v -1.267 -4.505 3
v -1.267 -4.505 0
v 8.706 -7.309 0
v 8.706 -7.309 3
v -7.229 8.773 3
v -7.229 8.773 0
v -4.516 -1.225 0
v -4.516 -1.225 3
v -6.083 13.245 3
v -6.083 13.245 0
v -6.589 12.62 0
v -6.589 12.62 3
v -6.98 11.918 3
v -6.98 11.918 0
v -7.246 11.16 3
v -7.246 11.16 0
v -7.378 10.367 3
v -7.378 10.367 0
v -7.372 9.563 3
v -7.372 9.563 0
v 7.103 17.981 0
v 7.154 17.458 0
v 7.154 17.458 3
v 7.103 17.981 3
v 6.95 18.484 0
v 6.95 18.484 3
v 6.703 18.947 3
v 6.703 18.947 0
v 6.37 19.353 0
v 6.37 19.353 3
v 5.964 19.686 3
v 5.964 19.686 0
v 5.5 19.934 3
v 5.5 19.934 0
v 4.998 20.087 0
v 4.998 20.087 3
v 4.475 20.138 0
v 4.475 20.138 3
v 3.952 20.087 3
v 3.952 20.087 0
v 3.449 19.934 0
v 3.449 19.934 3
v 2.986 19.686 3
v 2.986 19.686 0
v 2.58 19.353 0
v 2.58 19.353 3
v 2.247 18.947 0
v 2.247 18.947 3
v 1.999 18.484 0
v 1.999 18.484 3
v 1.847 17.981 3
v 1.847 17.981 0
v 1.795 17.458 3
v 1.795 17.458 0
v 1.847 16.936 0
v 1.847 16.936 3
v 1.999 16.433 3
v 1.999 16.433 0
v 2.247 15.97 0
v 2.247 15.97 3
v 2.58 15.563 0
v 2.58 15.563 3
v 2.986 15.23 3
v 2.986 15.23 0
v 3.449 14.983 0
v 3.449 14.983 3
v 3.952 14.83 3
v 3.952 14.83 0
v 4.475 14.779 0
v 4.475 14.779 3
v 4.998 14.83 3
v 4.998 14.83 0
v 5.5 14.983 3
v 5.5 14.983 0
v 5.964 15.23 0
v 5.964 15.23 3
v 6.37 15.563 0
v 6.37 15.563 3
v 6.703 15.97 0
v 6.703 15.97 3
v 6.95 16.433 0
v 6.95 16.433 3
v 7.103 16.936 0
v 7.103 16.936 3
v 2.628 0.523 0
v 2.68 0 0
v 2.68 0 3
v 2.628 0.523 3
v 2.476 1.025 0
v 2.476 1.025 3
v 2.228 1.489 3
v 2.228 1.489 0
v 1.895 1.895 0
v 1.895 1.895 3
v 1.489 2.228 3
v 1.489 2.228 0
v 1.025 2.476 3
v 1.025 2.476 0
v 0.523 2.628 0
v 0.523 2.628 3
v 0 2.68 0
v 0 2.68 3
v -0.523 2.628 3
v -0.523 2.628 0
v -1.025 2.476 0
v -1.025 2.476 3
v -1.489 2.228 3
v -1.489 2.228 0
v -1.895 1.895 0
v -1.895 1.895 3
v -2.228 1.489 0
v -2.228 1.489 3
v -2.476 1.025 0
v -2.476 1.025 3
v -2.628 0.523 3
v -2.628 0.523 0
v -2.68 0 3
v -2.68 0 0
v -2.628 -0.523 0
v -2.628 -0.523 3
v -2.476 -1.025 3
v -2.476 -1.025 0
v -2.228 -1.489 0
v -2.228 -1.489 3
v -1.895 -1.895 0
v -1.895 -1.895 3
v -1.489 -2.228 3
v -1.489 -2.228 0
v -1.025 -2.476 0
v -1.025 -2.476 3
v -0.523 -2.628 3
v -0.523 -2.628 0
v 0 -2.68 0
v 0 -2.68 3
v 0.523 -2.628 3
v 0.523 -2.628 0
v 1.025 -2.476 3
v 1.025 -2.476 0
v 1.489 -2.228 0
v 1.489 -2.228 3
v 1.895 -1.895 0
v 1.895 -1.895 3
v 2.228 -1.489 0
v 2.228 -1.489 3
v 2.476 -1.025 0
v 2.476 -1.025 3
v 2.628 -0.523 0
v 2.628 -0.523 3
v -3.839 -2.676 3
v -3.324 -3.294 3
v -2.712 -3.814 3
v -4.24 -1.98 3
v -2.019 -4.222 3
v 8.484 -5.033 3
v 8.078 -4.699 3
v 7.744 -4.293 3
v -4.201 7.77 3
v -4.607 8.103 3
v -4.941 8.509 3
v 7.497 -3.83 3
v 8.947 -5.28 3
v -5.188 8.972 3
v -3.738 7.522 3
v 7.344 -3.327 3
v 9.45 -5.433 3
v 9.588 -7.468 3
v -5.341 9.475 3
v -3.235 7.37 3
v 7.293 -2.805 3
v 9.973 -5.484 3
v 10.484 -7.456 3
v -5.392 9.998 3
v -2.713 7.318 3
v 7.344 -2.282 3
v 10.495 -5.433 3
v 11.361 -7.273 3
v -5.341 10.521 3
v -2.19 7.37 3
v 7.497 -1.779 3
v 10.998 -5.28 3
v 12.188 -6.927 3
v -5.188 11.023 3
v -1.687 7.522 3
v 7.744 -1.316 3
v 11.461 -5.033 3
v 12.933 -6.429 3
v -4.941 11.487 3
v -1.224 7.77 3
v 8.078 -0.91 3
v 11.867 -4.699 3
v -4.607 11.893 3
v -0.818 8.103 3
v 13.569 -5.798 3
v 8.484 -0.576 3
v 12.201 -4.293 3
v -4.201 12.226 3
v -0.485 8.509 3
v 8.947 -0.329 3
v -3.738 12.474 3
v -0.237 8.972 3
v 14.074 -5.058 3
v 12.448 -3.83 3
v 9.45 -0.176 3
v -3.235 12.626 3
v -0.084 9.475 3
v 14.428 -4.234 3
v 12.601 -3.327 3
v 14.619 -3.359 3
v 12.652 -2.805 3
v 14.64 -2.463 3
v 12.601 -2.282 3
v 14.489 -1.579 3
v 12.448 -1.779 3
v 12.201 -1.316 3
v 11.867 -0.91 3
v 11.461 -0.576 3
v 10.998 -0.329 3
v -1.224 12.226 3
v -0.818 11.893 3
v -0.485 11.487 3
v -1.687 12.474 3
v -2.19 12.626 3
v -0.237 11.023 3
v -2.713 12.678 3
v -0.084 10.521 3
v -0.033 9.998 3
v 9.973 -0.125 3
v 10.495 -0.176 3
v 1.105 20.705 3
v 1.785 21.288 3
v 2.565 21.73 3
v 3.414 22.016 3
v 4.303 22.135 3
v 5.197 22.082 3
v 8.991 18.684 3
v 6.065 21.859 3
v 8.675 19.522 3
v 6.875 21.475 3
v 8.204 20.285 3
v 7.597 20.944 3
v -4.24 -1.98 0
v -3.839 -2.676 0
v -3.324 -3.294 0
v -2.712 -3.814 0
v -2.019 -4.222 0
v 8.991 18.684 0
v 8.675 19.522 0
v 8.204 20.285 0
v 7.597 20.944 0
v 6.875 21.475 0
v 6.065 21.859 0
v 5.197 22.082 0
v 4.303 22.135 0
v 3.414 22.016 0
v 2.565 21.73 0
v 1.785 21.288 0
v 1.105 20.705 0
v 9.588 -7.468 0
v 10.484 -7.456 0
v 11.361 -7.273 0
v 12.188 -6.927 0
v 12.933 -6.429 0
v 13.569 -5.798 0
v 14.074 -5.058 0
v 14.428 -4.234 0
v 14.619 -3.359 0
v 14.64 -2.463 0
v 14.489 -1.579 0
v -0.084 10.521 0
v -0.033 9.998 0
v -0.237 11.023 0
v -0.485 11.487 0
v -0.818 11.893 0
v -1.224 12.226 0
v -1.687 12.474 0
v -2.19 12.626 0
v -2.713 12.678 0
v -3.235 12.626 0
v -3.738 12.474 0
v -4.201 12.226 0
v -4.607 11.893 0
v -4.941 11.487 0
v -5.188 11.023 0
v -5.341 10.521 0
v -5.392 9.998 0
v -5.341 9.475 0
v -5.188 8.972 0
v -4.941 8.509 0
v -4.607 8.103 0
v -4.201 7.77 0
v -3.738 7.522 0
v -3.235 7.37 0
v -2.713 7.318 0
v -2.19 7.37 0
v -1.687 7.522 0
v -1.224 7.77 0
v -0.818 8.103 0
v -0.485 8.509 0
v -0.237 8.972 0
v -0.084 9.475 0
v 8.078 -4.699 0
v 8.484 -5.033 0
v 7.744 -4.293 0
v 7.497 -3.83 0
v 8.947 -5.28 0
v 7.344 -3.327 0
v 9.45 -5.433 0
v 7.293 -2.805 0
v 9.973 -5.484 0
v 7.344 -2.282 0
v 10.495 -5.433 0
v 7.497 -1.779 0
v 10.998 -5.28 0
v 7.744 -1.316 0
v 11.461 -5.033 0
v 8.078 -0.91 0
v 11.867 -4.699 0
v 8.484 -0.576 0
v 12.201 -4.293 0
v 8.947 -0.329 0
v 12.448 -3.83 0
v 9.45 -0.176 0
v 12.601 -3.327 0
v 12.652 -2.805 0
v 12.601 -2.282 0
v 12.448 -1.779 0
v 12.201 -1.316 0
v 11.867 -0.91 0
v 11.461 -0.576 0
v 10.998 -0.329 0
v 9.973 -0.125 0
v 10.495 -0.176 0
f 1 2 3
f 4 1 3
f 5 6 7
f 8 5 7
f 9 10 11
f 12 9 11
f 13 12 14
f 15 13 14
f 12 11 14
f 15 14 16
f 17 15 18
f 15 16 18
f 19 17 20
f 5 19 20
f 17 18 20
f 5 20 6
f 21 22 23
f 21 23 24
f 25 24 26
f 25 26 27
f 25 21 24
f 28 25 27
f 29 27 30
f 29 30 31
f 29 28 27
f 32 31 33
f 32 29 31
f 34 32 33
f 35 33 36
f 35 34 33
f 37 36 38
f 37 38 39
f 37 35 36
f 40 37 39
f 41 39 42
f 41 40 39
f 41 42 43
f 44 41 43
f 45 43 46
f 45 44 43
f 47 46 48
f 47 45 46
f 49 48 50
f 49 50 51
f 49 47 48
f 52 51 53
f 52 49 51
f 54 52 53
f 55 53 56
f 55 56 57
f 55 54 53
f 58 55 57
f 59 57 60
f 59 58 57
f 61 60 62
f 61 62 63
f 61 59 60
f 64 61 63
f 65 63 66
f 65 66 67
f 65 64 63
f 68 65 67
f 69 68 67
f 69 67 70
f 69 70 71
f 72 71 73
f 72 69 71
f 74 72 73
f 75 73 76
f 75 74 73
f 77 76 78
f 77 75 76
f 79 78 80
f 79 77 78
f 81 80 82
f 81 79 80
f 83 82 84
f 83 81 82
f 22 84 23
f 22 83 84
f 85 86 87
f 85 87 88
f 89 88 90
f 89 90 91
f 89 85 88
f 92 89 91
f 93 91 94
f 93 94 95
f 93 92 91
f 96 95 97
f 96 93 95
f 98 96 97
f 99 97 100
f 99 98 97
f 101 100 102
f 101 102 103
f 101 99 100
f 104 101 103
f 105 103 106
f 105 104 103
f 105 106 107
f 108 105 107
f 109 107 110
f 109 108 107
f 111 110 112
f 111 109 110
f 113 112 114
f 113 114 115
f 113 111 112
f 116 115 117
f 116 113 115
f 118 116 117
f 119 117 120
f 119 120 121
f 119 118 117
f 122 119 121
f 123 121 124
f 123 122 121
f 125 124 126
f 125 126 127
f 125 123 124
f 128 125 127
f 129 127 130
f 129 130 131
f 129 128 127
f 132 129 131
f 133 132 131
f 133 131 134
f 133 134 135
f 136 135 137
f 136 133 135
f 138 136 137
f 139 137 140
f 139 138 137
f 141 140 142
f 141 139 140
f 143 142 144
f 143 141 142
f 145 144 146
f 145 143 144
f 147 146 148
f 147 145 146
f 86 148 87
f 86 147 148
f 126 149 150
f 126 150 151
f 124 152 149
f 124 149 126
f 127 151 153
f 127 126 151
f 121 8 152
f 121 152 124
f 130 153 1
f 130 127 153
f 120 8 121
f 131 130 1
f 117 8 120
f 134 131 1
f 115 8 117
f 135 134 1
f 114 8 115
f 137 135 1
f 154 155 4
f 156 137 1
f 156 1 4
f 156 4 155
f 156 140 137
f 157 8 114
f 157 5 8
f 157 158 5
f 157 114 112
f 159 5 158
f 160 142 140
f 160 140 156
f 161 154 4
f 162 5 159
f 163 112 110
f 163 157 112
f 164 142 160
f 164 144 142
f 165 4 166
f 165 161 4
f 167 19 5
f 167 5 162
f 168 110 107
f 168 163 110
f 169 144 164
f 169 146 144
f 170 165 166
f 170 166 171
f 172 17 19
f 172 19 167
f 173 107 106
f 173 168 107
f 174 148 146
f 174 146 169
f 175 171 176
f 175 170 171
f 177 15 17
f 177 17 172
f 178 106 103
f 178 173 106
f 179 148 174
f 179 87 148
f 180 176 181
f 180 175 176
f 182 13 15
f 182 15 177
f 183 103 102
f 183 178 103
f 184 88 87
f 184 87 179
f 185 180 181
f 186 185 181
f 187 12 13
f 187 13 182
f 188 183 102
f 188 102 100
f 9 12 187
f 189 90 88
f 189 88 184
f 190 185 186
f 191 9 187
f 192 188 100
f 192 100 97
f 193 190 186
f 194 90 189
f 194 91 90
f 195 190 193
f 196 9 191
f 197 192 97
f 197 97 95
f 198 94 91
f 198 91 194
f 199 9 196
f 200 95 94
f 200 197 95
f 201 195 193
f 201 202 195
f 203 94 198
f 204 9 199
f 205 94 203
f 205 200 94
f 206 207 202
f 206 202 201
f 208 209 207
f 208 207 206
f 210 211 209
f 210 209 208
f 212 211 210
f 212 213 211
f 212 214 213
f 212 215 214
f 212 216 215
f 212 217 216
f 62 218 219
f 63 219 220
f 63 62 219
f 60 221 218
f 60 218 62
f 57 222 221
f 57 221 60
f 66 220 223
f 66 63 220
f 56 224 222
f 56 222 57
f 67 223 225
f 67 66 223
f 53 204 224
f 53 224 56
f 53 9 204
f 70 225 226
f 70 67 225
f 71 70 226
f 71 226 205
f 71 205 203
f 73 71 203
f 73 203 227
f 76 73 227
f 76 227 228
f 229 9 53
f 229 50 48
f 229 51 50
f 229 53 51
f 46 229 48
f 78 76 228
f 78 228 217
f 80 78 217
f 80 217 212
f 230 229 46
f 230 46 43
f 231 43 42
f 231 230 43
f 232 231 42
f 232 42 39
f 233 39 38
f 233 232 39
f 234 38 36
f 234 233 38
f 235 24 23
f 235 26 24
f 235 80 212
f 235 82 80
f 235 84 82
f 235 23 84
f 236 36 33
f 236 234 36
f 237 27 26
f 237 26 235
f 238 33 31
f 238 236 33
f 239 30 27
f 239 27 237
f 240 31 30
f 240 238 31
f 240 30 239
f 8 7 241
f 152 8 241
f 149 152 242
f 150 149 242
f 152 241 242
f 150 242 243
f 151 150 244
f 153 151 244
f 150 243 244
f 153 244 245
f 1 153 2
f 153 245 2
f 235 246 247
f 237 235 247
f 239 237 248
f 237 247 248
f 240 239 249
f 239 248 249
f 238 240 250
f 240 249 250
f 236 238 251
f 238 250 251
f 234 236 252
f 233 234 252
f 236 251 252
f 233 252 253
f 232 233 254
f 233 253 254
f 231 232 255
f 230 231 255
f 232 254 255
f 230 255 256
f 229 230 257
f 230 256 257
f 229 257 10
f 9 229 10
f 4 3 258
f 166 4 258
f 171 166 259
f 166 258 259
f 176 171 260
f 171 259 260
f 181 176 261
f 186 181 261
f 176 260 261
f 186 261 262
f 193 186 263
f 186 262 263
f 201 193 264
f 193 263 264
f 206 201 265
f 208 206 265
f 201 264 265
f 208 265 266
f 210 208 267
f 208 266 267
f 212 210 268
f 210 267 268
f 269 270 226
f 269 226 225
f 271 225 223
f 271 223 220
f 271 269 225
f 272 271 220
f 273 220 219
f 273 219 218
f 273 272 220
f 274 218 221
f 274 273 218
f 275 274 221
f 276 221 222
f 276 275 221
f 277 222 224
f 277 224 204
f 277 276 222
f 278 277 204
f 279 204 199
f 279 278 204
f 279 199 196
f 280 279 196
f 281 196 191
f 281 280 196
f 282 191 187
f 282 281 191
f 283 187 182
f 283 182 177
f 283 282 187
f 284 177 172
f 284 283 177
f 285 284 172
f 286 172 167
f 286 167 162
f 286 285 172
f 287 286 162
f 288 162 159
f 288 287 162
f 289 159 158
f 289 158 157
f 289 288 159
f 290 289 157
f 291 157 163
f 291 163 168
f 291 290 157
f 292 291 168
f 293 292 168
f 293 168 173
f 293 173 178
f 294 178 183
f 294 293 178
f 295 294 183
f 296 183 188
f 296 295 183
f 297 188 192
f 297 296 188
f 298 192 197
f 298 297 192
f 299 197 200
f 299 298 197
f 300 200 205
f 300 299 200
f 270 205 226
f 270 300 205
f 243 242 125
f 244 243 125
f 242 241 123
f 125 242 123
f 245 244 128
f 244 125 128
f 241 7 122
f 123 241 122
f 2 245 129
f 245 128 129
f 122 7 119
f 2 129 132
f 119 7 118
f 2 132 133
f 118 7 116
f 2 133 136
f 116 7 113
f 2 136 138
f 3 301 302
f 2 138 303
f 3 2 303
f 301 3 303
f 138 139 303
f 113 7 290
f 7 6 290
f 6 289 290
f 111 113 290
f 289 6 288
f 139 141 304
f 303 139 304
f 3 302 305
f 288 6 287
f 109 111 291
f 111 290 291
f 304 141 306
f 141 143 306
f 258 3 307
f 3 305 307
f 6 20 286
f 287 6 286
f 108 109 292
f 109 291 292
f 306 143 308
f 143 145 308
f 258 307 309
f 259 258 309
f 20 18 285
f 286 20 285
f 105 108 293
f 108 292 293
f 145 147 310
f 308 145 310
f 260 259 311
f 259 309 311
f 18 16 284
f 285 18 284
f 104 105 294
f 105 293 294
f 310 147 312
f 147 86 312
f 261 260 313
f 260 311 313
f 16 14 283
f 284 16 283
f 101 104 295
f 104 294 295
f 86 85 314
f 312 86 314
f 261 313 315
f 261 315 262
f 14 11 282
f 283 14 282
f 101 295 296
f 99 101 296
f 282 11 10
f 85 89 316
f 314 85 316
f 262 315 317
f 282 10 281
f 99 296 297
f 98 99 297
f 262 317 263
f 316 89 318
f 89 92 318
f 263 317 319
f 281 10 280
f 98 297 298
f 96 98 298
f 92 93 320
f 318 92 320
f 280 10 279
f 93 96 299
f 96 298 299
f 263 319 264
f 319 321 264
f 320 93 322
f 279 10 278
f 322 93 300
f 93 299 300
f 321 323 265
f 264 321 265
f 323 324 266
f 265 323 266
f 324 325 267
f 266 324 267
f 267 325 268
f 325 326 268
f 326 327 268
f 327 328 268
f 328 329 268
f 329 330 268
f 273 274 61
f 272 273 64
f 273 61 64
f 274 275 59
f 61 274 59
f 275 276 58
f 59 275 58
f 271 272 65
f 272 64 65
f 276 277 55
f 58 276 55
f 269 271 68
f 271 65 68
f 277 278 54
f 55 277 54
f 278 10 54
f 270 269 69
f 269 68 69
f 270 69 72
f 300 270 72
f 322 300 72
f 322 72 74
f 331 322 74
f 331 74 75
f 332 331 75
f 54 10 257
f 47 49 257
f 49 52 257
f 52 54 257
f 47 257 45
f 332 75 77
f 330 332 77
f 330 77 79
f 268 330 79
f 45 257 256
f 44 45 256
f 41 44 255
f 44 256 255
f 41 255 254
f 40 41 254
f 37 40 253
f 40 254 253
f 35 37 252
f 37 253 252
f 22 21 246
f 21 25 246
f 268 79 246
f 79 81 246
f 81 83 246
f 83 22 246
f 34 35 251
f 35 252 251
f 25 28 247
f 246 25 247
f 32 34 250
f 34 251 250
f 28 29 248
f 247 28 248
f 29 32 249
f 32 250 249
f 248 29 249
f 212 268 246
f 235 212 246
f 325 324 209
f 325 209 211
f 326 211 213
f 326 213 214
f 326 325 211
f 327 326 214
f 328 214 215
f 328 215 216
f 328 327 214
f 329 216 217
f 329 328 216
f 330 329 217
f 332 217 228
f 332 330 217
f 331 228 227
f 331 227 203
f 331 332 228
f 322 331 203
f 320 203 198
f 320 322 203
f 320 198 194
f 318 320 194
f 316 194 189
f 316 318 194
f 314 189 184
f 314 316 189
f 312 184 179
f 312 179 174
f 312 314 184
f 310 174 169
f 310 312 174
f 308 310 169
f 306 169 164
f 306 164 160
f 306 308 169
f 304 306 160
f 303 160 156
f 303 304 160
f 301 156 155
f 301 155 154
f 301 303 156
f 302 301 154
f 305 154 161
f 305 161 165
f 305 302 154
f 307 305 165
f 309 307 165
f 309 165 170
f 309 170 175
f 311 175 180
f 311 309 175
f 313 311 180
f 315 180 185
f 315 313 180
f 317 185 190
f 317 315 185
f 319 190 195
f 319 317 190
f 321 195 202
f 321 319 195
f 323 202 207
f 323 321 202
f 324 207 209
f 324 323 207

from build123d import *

# Parameters (mm, degrees)
F1_R     = 2.679687
F2_DEPTH = 3


with BuildPart() as f2:
    # F1 (on Top) → F2 (new body)
    with BuildSketch(Plane.XY):
        with BuildLine():
            Line((1.104634, 20.705122), (-6.082774, 13.244711))
            ThreePointArc((-6.082774, 13.244711), (-7.2458, 11.159807), (-7.229049, 8.772513))
            Line((-7.229049, 8.772513), (-4.516401, -1.225397))
            ThreePointArc((-4.516401, -1.225397), (-3.324232, -3.293775), (-1.266915, -4.504931))
            Line((-1.266915, -4.504931), (8.705599, -7.309485))
            ThreePointArc((8.705599, -7.309485), (13.266291, -6.128786), (14.488918, -1.579154))
            Line((14.488918, -1.579154), (8.991166, 18.683715))
            ThreePointArc((8.991166, 18.683715), (5.63666, 21.991473), (1.104634, 20.705122))
        make_face()
        Circle(F1_R, mode=Mode.SUBTRACT)
        with Locations((9.972518, -2.804555)):
            Circle(F1_R, mode=Mode.SUBTRACT)
        with Locations((-2.712648, 9.997909)):
            Circle(F1_R, mode=Mode.SUBTRACT)
        with Locations((4.474763, 17.458323)):
            Circle(F1_R, mode=Mode.SUBTRACT)
    extrude(amount=F2_DEPTH)


solid = f2.part
